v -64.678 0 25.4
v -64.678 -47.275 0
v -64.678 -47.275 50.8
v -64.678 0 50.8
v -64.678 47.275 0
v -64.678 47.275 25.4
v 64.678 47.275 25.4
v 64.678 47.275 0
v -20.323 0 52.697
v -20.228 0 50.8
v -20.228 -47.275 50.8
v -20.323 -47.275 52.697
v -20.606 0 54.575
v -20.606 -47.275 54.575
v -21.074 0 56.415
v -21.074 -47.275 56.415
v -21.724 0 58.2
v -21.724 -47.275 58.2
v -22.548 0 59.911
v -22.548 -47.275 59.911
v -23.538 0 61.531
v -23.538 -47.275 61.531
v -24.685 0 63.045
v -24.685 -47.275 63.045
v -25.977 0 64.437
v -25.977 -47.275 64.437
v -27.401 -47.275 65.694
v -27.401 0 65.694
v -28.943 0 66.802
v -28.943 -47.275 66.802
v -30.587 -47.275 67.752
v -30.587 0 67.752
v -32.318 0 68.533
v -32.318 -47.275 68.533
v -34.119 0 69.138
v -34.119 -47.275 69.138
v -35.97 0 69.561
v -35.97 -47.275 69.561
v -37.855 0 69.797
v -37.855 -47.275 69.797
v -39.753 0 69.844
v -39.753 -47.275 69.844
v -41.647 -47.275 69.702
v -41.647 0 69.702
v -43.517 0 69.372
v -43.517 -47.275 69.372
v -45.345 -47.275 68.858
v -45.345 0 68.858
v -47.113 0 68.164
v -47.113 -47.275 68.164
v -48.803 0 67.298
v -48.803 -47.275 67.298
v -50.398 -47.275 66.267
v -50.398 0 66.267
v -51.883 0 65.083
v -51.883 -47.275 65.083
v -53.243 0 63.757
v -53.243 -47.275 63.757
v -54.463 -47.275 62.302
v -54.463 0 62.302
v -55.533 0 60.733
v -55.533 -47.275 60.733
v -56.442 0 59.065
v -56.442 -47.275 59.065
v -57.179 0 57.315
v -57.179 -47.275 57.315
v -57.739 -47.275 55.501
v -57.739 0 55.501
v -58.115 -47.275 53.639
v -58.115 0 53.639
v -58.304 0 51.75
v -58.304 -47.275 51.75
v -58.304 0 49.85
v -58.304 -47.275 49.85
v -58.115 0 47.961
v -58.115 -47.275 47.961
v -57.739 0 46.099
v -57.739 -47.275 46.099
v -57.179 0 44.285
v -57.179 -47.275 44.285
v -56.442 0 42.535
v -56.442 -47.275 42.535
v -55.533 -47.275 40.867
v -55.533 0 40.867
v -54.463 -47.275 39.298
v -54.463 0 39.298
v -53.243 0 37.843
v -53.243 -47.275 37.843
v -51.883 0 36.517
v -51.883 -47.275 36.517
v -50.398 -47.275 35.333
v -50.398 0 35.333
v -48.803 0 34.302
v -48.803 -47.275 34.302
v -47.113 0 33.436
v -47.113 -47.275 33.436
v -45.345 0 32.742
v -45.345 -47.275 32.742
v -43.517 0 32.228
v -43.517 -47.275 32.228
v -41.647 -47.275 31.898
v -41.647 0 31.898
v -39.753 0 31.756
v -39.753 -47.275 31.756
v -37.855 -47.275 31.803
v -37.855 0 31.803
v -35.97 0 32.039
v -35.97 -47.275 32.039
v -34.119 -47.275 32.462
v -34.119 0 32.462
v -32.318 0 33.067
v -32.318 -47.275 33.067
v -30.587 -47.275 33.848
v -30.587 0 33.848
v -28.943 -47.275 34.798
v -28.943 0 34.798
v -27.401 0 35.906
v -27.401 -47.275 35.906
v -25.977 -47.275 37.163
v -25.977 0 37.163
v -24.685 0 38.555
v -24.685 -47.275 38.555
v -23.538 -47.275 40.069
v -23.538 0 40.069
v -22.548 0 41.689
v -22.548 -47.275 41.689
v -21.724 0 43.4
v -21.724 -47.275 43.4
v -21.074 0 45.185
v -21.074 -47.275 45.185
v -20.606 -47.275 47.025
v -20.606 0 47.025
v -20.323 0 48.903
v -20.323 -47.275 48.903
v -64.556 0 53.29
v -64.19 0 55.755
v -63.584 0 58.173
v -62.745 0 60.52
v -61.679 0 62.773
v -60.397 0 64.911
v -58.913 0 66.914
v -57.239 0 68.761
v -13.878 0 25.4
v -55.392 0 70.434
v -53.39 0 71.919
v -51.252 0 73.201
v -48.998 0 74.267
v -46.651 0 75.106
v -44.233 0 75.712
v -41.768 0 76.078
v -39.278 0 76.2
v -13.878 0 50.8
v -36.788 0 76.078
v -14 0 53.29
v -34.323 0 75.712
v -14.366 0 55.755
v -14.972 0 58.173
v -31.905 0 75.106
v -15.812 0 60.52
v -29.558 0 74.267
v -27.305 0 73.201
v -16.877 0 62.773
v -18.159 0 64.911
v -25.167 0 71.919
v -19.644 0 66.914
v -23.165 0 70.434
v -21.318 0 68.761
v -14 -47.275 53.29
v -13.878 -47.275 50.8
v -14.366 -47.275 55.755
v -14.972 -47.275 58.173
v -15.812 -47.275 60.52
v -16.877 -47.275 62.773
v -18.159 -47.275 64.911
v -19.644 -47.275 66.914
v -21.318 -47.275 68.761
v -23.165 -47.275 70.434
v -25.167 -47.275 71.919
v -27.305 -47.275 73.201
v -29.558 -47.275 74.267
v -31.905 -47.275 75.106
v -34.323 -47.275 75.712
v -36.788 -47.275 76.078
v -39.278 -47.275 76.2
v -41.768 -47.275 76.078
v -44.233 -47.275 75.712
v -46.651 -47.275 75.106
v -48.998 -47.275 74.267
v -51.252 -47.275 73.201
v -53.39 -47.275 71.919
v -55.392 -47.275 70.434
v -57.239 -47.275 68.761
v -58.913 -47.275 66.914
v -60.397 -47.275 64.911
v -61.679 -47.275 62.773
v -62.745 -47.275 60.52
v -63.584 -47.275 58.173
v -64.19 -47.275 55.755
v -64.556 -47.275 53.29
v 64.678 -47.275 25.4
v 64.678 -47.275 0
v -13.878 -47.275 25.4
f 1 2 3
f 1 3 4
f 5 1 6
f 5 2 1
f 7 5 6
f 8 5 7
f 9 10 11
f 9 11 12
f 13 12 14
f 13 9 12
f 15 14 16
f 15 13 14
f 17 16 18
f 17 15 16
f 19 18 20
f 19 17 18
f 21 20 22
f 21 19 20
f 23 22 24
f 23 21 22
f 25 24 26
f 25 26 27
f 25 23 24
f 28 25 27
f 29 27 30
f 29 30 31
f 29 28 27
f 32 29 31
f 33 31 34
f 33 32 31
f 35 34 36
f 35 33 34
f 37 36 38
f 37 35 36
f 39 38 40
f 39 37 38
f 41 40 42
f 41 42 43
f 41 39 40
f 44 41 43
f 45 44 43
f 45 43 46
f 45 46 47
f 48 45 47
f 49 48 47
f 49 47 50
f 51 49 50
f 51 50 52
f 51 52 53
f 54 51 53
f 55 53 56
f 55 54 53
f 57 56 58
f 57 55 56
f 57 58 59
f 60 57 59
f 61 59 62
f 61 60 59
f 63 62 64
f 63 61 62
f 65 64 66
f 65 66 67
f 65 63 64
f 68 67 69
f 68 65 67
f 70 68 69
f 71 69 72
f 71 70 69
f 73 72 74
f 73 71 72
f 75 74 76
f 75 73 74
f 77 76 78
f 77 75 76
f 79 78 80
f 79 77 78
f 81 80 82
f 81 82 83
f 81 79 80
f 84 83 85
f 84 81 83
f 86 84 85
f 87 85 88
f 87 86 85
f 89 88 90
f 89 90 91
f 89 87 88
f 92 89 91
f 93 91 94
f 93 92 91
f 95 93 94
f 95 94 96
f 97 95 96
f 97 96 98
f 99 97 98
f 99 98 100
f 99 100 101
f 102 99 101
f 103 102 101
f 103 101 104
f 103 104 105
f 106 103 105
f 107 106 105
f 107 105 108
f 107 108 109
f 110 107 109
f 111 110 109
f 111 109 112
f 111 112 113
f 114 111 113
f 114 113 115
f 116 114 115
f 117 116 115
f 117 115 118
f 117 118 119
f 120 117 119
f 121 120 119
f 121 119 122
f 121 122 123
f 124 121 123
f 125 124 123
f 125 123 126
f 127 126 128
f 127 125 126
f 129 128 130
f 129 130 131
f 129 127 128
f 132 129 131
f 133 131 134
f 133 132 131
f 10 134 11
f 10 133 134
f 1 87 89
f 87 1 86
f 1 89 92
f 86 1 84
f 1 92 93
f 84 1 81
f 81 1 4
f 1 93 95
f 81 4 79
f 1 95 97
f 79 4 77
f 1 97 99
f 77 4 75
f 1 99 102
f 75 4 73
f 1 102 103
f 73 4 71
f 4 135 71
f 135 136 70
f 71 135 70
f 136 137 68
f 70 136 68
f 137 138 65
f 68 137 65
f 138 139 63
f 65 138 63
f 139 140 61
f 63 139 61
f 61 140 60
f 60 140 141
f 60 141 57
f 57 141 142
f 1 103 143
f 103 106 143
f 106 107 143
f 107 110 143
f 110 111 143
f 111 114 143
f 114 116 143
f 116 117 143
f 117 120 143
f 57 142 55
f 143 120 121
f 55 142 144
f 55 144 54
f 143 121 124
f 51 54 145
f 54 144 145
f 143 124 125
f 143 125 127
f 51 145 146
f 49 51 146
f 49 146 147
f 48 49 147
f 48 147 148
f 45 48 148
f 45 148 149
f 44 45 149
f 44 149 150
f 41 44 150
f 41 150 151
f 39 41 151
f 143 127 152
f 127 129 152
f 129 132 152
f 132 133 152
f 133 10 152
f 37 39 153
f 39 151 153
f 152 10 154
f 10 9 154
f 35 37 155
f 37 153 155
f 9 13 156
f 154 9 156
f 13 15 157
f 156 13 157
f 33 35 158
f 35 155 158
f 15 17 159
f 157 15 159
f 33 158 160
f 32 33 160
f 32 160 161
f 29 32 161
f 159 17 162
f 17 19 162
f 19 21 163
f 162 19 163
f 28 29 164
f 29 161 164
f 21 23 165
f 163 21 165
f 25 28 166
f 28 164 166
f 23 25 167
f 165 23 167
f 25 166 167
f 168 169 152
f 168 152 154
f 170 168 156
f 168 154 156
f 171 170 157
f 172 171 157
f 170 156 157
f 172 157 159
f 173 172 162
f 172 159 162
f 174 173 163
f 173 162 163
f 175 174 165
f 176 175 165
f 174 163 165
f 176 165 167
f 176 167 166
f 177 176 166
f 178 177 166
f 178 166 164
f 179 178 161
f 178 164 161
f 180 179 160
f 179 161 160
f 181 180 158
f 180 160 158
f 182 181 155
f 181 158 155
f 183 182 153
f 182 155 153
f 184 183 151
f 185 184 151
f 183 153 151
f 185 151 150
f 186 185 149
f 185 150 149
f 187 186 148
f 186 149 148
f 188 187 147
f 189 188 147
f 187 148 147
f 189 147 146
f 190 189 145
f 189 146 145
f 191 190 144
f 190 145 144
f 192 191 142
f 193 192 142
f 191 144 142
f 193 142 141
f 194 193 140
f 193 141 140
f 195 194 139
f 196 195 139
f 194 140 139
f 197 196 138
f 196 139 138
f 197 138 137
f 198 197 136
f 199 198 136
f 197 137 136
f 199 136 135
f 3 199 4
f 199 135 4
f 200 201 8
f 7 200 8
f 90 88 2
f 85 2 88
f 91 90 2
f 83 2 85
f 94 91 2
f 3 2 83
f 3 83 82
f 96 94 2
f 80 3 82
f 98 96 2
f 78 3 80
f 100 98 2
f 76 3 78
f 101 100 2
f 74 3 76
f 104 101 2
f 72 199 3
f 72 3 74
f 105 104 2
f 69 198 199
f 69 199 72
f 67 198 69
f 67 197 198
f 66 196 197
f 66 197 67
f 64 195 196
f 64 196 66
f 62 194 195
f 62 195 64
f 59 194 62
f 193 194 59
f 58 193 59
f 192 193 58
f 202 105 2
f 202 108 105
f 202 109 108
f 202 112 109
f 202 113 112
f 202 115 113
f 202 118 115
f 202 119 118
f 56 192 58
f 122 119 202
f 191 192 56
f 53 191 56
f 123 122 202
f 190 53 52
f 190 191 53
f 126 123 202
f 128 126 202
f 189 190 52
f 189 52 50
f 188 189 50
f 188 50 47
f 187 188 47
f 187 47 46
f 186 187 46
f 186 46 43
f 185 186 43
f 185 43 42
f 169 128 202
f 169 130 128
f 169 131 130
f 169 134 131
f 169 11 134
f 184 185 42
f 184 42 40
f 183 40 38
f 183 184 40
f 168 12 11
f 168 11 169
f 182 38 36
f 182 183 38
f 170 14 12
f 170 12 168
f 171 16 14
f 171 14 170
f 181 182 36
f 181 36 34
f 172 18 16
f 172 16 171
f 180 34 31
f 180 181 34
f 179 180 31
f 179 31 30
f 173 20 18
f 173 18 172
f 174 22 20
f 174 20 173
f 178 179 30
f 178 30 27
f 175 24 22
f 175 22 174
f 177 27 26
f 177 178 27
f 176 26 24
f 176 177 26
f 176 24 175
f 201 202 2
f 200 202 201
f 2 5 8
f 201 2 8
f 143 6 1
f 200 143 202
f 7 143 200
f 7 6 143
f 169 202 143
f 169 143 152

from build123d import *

# Parameters (mm, degrees)
F0_W     = 129.356236
F0_H     = 94.549194
F1_DEPTH = 25.4
F2_R     = 19.05
F3_DEPTH = 47.274597


with BuildPart() as f1:
    # F0 (on Top) → F1 (new body)
    with BuildSketch(Plane.XY):
        Rectangle(F0_W, F0_H)
    extrude(amount=F1_DEPTH)

    # F2 (on Front) → F3 (join, through all)
    with BuildSketch(Plane.XZ):
        with BuildLine():
            Line((-13.878118, 25.4), (-13.878118, 50.8))
            ThreePointArc((-13.878118, 50.8), (-39.278118, 76.2), (-64.678118, 50.8))
            Line((-64.678118, 50.8), (-64.678118, 25.4))
            Line((-64.678118, 25.4), (-13.878118, 25.4))
        make_face()
        with Locations((-39.278118, 50.8)):
            Circle(F2_R, mode=Mode.SUBTRACT)
    extrude(amount=F3_DEPTH)


solid = f1.part
